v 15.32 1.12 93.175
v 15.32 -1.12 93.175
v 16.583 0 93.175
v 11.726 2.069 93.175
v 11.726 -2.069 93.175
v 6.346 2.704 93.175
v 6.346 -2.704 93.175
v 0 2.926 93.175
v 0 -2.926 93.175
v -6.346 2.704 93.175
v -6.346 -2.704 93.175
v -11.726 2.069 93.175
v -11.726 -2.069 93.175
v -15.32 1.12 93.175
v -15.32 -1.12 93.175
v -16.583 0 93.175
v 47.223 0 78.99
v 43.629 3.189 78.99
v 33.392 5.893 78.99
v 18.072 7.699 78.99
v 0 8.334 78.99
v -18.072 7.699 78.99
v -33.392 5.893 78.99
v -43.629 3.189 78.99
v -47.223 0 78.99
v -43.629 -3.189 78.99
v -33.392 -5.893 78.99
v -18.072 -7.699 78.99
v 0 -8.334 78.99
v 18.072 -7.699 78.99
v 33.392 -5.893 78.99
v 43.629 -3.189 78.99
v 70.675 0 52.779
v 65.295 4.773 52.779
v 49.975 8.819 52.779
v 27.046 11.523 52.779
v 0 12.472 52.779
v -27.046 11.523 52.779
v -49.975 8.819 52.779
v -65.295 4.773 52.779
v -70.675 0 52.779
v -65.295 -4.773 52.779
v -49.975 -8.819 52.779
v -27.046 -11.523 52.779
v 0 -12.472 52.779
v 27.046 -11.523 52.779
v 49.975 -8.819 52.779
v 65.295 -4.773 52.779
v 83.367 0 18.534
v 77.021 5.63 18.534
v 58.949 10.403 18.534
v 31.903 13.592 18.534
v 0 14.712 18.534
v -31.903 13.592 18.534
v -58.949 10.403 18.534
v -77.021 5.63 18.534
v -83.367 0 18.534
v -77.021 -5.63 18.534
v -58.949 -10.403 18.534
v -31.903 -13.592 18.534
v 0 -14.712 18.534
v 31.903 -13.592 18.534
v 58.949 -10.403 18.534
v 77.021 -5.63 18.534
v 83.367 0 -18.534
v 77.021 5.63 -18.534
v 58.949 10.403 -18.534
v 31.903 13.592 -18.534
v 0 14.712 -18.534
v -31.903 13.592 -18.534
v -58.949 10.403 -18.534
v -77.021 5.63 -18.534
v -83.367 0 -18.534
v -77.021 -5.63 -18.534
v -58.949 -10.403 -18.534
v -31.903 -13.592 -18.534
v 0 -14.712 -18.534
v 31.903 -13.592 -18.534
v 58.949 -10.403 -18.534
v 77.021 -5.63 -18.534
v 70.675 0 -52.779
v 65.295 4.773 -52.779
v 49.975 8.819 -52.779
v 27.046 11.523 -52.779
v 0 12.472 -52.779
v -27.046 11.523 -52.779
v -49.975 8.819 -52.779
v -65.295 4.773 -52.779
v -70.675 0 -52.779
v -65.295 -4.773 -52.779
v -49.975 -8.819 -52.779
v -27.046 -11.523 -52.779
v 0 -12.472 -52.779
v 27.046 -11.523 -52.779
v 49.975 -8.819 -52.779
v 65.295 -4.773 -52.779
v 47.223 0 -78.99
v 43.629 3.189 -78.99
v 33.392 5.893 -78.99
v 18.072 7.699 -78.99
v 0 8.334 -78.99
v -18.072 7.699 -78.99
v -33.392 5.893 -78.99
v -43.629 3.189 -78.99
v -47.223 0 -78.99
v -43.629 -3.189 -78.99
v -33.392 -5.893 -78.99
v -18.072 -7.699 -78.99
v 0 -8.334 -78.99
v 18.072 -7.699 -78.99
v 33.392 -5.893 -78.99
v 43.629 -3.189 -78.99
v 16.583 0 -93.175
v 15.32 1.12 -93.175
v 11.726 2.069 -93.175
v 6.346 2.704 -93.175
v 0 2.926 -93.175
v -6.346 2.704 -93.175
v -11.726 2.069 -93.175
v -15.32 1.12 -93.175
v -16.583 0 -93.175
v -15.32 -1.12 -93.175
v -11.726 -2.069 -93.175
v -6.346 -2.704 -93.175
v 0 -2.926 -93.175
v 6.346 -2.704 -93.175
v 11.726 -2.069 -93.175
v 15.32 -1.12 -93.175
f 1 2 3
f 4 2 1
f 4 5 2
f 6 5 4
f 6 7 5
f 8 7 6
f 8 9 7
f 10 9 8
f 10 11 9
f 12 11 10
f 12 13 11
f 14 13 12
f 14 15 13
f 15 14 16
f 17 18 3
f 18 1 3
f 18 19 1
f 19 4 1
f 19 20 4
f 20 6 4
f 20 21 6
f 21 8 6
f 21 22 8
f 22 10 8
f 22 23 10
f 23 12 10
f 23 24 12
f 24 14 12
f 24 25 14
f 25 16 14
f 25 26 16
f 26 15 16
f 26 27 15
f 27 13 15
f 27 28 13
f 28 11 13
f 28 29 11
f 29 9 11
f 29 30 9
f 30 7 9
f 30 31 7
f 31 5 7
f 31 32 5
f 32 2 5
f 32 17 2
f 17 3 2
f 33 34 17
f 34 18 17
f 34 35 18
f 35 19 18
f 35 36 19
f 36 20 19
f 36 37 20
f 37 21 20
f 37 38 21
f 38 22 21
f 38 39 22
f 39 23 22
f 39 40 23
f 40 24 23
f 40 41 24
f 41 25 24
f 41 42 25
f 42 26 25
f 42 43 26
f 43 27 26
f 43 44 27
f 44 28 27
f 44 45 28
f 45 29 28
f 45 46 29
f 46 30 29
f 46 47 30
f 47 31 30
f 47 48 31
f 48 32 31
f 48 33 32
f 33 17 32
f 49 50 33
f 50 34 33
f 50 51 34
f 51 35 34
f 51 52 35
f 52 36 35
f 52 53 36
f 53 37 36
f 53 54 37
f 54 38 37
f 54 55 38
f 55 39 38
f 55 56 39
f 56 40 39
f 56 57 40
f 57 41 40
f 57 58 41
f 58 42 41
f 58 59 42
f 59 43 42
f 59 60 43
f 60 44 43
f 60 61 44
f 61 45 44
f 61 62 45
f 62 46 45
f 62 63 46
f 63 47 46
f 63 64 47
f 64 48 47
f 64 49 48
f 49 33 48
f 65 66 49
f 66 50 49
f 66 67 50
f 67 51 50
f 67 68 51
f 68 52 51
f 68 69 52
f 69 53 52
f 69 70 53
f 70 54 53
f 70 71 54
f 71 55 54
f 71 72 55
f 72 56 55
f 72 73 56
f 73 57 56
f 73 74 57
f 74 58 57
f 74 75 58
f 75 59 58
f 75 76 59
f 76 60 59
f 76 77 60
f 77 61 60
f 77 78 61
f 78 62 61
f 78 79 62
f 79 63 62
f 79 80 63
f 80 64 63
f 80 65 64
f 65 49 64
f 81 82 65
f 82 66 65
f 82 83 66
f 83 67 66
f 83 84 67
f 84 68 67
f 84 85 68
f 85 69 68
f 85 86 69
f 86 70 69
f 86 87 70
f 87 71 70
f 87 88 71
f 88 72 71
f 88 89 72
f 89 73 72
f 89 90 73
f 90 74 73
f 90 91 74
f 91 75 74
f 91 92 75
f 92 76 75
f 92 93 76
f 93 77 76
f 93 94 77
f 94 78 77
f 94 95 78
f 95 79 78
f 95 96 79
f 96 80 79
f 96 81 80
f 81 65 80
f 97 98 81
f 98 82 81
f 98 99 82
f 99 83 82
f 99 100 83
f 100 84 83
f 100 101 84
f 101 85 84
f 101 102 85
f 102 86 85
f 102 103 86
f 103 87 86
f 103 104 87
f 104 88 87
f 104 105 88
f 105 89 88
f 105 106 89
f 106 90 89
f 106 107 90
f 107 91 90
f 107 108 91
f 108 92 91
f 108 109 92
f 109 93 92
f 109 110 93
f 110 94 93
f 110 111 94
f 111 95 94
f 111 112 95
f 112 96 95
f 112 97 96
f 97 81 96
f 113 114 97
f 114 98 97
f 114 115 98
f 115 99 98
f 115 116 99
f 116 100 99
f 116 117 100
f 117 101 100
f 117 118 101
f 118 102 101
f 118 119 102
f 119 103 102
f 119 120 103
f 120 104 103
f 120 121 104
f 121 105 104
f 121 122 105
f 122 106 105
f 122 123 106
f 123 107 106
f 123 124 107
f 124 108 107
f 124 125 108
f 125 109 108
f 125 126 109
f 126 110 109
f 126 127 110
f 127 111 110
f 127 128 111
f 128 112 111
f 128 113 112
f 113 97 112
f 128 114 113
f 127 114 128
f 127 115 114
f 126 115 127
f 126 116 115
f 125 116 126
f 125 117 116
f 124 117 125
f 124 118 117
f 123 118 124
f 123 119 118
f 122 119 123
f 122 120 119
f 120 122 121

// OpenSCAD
// Generated by SolidPython 1.0.1 on 2020-07-29 00:46:52


scale(v = [17, 3, 19]) {
	sphere(r = 5);
}
/***********************************************
*********      SolidPython code:      **********
************************************************
 
# import packages: SolidPython
from solid import *
from solid.utils import *
from itertools import chain, combinations, permutations


class Resize:

    def __init__(self, scad_file):
        self.scad_file = scad_file
        #self.scad_file = import_scad(scad_file)
        # cone/cylinder param:
        self.r1 = 0
        self.r2 = 0
        self.h = 0
        # rectangular prism param:
        self.w = 0
        self.l = 0
        # ellipse param:
        self.r = 0

    # import OpenScad code (file name corresponds to shape)


    # classify shape + parameters
    def assign(self, param1, param2, param3):
        if self.scad_file == 'cone.scad':
            self.r1 = param1
            self.r2 = param2
            self.h = param3
        elif self.scad_file == 'cylinder.scad':
            self.r1 = param1
            self.r2 = param2
            self.h = param3
        elif self.scad_file == 'rectangularPrism.scad':
            self.h = param1
            self.l = param2
            self.w = param3
        else:
            self.r = param1
            self.h = param2

    # resize parameters
    def iterate(self):
        x = range(3, 20, 2)
        i = 1
        if self.scad_file == 'cone.scad':
            tempList = list(permutations(x, 2))
            for temp in tempList:
                param1 = temp[0]
                param2 = temp[1]
                filepath = 'produced_scad_files/' + 'cone' + str(param1) + '_' + str(param2) + '_' + '.scad'
                scad_render_to_file(cylinder(h=param1, r1=param2, r2=0), filepath)

        elif self.scad_file == 'cylinder.scad':
            tempList = list(permutations(x, 3))
            for temp in tempList:
                param1 = temp[0]
                param2 = temp[1]
                filepath = 'produced_scad_files/' + 'cylinder' + str(param1) + '_' + str(param2) + '_' + '.scad'
                scad_render_to_file(cylinder(h=param1, r1=param2, r2=param2), filepath)

        elif self.scad_file == 'rectangularPrism.scad':
            tempList = list(permutations(x, 3))
            for temp in tempList:
                param1 = temp[0]
                param2 = temp[1]
                param3 = temp[2]
                filepath = 'produced_scad_files/' + 'rectangularPrism' + str(param1) + '_' + str(param2) + '_' + str(
                    param3) + '.scad'
                scad_render_to_file(cube(size=(param1, param2, param3)), filepath)

        elif self.scad_file == 'ellipse.scad':
            tempList = list(permutations(x, 4))
            for temp in tempList:
                param1 = temp[0]
                param2 = temp[1]
                param3 = temp[2]
                param4 = temp[3]
                filepath = 'produced_scad_files/' + 'ellipse' + str(param1) + '_' + str(param2) + '_' + str(param3) + '_' + str(param4) + '.scad'
                scad_render_to_file(scale([param1, param2, param3])(sphere(r=param4)), filepath)

    def render_to_scadfile(self):
        scad_render_to_file(scad, 'example.scad') 
 
************************************************/
